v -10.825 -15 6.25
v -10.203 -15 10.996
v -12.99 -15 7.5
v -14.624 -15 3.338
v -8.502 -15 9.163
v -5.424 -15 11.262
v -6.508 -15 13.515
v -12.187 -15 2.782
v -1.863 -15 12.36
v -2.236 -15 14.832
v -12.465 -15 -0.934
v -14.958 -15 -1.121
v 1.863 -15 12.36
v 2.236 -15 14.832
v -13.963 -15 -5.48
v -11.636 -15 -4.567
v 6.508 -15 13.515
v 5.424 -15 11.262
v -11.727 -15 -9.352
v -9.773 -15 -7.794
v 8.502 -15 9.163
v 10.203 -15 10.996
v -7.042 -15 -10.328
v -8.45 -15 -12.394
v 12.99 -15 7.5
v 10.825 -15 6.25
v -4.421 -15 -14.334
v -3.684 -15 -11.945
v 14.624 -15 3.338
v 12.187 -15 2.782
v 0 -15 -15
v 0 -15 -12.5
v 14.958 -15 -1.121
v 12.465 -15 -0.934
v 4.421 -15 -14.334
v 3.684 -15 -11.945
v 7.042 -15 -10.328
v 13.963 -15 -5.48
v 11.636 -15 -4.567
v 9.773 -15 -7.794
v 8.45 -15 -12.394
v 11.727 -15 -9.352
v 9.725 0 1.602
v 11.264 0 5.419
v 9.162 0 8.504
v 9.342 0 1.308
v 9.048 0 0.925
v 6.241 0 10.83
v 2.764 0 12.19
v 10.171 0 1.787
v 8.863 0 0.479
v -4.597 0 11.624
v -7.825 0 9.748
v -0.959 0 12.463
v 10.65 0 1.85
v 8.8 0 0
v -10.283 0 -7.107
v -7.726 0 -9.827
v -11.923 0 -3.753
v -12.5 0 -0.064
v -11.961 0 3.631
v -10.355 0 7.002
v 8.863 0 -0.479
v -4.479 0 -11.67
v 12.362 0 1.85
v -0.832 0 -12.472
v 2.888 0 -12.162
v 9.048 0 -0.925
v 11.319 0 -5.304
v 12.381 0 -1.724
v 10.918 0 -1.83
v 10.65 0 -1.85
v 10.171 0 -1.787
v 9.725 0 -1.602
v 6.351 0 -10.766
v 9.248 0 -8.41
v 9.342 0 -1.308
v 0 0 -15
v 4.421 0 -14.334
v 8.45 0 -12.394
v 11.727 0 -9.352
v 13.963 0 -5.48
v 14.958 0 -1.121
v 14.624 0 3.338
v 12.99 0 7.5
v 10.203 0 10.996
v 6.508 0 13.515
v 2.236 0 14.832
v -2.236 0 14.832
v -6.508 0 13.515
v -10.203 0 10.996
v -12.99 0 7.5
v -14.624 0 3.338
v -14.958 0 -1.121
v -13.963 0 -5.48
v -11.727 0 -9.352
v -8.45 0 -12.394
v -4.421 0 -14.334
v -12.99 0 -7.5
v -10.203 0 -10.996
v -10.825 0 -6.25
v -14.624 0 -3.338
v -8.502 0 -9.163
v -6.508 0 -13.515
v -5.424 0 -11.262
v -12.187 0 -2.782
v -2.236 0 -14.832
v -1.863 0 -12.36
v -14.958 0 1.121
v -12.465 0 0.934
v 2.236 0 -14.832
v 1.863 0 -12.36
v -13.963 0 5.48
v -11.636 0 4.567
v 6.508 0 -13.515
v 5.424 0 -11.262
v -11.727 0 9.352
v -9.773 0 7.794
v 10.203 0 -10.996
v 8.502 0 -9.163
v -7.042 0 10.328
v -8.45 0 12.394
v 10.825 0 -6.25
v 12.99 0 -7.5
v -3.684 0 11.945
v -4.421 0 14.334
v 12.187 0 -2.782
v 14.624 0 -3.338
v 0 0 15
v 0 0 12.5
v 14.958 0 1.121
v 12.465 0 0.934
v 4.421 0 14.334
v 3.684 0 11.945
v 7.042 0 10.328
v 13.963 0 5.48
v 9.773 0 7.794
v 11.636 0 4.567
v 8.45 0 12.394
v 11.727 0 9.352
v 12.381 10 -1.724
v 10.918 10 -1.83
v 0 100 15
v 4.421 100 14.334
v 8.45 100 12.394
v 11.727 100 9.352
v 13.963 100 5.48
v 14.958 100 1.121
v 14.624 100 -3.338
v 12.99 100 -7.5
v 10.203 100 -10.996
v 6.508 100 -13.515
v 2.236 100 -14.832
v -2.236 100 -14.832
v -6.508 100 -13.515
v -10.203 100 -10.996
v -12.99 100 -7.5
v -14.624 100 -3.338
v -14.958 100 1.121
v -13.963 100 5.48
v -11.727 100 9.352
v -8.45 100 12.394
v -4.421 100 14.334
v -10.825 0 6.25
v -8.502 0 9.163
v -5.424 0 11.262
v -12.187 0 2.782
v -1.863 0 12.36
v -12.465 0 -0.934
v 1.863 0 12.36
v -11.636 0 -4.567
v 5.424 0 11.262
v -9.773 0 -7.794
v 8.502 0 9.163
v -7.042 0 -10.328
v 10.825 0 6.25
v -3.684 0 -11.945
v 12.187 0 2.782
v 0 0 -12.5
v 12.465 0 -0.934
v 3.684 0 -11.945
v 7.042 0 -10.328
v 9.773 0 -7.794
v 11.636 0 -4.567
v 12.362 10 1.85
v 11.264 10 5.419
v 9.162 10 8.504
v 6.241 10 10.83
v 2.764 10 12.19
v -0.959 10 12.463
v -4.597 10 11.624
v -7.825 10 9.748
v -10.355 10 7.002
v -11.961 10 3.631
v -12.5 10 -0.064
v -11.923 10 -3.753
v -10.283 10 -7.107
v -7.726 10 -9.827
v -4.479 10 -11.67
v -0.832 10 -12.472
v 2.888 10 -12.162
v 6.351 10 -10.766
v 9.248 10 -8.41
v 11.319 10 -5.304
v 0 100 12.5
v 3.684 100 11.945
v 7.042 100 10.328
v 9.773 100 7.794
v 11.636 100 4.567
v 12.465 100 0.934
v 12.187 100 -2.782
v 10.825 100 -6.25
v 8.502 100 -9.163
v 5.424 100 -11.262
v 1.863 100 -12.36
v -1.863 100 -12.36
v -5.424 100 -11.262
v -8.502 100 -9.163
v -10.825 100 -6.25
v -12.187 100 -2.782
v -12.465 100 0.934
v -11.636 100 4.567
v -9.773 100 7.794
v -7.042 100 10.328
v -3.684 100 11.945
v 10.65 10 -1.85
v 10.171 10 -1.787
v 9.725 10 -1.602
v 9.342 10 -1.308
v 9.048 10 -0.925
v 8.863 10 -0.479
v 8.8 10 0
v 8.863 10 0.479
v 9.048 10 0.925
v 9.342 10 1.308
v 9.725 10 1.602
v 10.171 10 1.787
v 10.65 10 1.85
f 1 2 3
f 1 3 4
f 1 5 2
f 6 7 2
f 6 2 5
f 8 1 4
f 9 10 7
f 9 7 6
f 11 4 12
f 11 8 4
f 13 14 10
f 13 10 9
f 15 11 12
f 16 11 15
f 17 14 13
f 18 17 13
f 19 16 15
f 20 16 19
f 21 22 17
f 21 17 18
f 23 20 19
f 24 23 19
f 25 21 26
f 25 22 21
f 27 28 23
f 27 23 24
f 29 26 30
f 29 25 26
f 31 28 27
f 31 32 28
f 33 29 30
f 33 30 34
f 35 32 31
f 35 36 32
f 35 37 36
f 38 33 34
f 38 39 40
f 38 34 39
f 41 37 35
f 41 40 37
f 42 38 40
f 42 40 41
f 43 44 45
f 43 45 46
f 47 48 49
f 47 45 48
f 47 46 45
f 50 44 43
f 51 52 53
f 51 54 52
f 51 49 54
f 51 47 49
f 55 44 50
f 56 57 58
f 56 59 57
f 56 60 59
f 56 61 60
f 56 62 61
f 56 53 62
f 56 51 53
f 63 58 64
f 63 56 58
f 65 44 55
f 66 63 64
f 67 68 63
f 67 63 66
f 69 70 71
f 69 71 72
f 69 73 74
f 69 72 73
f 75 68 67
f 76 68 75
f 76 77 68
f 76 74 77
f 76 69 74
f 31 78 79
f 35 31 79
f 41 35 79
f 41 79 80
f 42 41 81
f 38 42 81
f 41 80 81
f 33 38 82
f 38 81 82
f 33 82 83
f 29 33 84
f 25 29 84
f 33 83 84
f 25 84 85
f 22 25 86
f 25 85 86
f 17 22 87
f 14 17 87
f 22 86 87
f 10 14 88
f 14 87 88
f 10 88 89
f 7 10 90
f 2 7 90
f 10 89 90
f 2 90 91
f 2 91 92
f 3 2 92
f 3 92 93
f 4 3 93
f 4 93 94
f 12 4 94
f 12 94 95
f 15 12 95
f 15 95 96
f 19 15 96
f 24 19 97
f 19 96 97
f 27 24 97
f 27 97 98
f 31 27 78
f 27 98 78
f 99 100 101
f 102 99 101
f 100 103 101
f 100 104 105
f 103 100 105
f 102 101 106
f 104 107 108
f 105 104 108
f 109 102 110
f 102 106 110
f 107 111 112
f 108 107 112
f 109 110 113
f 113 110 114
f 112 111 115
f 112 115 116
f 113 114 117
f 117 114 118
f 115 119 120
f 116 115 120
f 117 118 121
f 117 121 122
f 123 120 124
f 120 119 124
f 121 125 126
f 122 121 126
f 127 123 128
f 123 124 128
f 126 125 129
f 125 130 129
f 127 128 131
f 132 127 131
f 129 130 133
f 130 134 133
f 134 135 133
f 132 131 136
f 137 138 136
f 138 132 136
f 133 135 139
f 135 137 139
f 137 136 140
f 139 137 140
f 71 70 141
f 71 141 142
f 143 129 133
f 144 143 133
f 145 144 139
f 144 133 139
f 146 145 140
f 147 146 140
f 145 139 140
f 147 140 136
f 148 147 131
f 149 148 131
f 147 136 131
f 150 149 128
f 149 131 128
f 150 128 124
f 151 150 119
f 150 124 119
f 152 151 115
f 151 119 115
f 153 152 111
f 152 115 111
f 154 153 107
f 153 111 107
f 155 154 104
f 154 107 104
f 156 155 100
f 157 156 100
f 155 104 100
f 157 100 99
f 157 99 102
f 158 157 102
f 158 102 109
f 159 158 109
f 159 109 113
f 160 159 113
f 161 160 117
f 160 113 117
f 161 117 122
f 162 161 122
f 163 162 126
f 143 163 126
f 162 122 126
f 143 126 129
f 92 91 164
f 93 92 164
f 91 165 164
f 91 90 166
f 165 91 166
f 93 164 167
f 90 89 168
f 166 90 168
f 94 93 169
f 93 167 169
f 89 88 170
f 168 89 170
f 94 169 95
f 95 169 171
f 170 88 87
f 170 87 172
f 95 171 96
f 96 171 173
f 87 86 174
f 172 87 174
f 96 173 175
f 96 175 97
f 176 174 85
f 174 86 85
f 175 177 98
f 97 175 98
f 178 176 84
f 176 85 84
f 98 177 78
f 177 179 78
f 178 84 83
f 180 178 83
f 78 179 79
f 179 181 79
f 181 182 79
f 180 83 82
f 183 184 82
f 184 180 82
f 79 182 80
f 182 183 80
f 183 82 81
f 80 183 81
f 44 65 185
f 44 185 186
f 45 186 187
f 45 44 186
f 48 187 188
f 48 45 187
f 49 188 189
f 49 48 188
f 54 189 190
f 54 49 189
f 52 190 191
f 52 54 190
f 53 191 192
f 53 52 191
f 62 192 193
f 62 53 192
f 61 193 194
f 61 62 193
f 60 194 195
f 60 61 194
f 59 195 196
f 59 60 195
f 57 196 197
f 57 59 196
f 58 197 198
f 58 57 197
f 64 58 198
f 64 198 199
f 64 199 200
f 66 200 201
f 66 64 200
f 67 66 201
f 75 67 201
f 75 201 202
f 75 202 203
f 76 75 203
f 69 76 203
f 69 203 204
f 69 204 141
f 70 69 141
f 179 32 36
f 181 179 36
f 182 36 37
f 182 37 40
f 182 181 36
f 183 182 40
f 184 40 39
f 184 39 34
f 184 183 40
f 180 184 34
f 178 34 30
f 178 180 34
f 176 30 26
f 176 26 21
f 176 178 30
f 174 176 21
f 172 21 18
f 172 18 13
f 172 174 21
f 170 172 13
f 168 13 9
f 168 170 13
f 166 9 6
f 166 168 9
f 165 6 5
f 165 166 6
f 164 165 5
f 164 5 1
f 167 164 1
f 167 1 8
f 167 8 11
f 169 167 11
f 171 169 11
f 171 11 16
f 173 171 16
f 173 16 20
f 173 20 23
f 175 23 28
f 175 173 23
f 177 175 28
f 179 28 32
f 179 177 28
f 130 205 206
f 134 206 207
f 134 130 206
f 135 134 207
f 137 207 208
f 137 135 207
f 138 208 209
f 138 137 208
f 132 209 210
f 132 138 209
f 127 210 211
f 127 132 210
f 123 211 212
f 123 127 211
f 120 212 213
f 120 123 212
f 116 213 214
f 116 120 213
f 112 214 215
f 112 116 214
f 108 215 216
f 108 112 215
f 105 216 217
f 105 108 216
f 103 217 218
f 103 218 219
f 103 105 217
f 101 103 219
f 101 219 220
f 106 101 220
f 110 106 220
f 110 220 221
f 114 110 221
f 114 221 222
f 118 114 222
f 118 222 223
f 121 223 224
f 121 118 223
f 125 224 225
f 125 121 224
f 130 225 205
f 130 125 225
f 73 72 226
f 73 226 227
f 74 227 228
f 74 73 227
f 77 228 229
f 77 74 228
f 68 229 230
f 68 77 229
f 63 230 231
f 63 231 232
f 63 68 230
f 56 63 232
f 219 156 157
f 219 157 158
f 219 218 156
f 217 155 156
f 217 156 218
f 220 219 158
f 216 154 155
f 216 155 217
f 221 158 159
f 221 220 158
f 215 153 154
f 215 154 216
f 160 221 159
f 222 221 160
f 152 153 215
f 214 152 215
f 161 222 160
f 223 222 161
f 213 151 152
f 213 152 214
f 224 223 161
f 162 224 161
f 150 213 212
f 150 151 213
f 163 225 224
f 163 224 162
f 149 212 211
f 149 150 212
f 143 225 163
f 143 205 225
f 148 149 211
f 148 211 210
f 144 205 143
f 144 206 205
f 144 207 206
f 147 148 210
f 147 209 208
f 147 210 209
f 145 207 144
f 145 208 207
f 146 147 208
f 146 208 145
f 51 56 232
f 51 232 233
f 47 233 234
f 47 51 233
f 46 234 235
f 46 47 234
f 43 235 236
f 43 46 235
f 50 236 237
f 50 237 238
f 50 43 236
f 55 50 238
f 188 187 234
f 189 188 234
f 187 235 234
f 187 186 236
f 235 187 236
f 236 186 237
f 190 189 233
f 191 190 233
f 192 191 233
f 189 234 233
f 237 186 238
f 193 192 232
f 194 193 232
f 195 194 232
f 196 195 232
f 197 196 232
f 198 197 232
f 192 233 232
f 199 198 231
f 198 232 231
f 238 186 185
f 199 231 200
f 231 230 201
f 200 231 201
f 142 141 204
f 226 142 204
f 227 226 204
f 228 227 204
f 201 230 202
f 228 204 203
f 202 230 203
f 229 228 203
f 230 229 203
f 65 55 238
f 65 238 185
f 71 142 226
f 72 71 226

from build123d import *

# Parameters (mm, degrees)
SKETCH1_R           = 15
SKETCH1_R_2         = 12.5
BOSS_EXTRUDE1_DEPTH = 100
SKETCH2_R           = 12.5
BOSS_EXTRUDE2_DEPTH = 10
SKETCH3_R           = 15
SKETCH3_R_2         = 12.5
BOSS_EXTRUDE3_DEPTH = 15
CUT_EXTRUDE1_START  = -15
CUT_EXTRUDE1_DEPTH  = 15


with BuildPart() as part:
    # Sketch1 → Boss-Extrude1 (new body)
    with BuildSketch(Plane(origin=(0, 0, 0), x_dir=(1, 0, 0), z_dir=(0, 1, 0))):
        with Locations(Location((0, 0, 0), (0, 0, 270))):
            Circle(SKETCH1_R)
        with Locations(Location((0, 0, 0), (0, 0, 270))):
            Circle(SKETCH1_R_2, mode=Mode.SUBTRACT)
    extrude(amount=BOSS_EXTRUDE1_DEPTH)


with BuildPart() as body_2:
    # Sketch2 → Boss-Extrude2 (new body)
    with BuildSketch(Plane.XZ):
        with Locations(Location((0, 0, 0), (0, 0, 270))):
            Circle(SKETCH2_R)
    extrude(amount=-BOSS_EXTRUDE2_DEPTH)

    # Sketch5 → Cut-Extrude1 (cut)
    with BuildSketch(Plane(origin=(0, 10, 0), x_dir=(1, 0, 0), z_dir=(0, 1, 0)).offset(CUT_EXTRUDE1_START)):
        with BuildLine():
            ThreePointArc((12.362342011, -1.85), (12.465537998, -0.927557238), (12.5, 0))
            ThreePointArc((12.5, 0), (11.958147545, -1.308147545), (10.65, -1.85))
            Line((10.65, -1.85), (12.362342011, -1.85))
        make_face()
        with BuildLine():
            ThreePointArc((10.65, -1.85), (11.958147545, -1.308147545), (12.5, 0))
            Line((12.5, 0), (8.8, 0))
            ThreePointArc((8.8, 0), (9.341852455, -1.308147545), (10.65, -1.85))
        make_face()
        with BuildLine():
            Line((8.8, 0), (12.5, 0))
            ThreePointArc((12.5, 0), (12.049680443, 1.209708501), (10.917951723, 1.830492249))
            Line((10.917951723, 1.830492249), (10.65, 1.85))
            ThreePointArc((10.65, 1.85), (9.341852455, 1.308147545), (8.8, 0))
        make_face()
        with BuildLine():
            ThreePointArc((10.917951723, 1.830492249), (12.049680443, 1.209708501), (12.5, 0))
            ThreePointArc((12.5, 0), (12.470099392, 0.86407243), (12.380540614, 1.724011054))
            Line((12.380540614, 1.724011054), (10.917951723, 1.830492249))
        make_face()
    extrude(amount=CUT_EXTRUDE1_DEPTH, mode=Mode.SUBTRACT)


with BuildPart() as body_3:
    # Sketch3 → Boss-Extrude3 (new body)
    with BuildSketch(Plane.XZ):
        with Locations(Location((0, 0, 0), (0, 0, 270))):
            Circle(SKETCH3_R)
        with Locations(Location((0, 0, 0), (0, 0, 270))):
            Circle(SKETCH3_R_2, mode=Mode.SUBTRACT)
    extrude(amount=BOSS_EXTRUDE3_DEPTH)


solid = Compound([part.part, body_2.part, body_3.part])
